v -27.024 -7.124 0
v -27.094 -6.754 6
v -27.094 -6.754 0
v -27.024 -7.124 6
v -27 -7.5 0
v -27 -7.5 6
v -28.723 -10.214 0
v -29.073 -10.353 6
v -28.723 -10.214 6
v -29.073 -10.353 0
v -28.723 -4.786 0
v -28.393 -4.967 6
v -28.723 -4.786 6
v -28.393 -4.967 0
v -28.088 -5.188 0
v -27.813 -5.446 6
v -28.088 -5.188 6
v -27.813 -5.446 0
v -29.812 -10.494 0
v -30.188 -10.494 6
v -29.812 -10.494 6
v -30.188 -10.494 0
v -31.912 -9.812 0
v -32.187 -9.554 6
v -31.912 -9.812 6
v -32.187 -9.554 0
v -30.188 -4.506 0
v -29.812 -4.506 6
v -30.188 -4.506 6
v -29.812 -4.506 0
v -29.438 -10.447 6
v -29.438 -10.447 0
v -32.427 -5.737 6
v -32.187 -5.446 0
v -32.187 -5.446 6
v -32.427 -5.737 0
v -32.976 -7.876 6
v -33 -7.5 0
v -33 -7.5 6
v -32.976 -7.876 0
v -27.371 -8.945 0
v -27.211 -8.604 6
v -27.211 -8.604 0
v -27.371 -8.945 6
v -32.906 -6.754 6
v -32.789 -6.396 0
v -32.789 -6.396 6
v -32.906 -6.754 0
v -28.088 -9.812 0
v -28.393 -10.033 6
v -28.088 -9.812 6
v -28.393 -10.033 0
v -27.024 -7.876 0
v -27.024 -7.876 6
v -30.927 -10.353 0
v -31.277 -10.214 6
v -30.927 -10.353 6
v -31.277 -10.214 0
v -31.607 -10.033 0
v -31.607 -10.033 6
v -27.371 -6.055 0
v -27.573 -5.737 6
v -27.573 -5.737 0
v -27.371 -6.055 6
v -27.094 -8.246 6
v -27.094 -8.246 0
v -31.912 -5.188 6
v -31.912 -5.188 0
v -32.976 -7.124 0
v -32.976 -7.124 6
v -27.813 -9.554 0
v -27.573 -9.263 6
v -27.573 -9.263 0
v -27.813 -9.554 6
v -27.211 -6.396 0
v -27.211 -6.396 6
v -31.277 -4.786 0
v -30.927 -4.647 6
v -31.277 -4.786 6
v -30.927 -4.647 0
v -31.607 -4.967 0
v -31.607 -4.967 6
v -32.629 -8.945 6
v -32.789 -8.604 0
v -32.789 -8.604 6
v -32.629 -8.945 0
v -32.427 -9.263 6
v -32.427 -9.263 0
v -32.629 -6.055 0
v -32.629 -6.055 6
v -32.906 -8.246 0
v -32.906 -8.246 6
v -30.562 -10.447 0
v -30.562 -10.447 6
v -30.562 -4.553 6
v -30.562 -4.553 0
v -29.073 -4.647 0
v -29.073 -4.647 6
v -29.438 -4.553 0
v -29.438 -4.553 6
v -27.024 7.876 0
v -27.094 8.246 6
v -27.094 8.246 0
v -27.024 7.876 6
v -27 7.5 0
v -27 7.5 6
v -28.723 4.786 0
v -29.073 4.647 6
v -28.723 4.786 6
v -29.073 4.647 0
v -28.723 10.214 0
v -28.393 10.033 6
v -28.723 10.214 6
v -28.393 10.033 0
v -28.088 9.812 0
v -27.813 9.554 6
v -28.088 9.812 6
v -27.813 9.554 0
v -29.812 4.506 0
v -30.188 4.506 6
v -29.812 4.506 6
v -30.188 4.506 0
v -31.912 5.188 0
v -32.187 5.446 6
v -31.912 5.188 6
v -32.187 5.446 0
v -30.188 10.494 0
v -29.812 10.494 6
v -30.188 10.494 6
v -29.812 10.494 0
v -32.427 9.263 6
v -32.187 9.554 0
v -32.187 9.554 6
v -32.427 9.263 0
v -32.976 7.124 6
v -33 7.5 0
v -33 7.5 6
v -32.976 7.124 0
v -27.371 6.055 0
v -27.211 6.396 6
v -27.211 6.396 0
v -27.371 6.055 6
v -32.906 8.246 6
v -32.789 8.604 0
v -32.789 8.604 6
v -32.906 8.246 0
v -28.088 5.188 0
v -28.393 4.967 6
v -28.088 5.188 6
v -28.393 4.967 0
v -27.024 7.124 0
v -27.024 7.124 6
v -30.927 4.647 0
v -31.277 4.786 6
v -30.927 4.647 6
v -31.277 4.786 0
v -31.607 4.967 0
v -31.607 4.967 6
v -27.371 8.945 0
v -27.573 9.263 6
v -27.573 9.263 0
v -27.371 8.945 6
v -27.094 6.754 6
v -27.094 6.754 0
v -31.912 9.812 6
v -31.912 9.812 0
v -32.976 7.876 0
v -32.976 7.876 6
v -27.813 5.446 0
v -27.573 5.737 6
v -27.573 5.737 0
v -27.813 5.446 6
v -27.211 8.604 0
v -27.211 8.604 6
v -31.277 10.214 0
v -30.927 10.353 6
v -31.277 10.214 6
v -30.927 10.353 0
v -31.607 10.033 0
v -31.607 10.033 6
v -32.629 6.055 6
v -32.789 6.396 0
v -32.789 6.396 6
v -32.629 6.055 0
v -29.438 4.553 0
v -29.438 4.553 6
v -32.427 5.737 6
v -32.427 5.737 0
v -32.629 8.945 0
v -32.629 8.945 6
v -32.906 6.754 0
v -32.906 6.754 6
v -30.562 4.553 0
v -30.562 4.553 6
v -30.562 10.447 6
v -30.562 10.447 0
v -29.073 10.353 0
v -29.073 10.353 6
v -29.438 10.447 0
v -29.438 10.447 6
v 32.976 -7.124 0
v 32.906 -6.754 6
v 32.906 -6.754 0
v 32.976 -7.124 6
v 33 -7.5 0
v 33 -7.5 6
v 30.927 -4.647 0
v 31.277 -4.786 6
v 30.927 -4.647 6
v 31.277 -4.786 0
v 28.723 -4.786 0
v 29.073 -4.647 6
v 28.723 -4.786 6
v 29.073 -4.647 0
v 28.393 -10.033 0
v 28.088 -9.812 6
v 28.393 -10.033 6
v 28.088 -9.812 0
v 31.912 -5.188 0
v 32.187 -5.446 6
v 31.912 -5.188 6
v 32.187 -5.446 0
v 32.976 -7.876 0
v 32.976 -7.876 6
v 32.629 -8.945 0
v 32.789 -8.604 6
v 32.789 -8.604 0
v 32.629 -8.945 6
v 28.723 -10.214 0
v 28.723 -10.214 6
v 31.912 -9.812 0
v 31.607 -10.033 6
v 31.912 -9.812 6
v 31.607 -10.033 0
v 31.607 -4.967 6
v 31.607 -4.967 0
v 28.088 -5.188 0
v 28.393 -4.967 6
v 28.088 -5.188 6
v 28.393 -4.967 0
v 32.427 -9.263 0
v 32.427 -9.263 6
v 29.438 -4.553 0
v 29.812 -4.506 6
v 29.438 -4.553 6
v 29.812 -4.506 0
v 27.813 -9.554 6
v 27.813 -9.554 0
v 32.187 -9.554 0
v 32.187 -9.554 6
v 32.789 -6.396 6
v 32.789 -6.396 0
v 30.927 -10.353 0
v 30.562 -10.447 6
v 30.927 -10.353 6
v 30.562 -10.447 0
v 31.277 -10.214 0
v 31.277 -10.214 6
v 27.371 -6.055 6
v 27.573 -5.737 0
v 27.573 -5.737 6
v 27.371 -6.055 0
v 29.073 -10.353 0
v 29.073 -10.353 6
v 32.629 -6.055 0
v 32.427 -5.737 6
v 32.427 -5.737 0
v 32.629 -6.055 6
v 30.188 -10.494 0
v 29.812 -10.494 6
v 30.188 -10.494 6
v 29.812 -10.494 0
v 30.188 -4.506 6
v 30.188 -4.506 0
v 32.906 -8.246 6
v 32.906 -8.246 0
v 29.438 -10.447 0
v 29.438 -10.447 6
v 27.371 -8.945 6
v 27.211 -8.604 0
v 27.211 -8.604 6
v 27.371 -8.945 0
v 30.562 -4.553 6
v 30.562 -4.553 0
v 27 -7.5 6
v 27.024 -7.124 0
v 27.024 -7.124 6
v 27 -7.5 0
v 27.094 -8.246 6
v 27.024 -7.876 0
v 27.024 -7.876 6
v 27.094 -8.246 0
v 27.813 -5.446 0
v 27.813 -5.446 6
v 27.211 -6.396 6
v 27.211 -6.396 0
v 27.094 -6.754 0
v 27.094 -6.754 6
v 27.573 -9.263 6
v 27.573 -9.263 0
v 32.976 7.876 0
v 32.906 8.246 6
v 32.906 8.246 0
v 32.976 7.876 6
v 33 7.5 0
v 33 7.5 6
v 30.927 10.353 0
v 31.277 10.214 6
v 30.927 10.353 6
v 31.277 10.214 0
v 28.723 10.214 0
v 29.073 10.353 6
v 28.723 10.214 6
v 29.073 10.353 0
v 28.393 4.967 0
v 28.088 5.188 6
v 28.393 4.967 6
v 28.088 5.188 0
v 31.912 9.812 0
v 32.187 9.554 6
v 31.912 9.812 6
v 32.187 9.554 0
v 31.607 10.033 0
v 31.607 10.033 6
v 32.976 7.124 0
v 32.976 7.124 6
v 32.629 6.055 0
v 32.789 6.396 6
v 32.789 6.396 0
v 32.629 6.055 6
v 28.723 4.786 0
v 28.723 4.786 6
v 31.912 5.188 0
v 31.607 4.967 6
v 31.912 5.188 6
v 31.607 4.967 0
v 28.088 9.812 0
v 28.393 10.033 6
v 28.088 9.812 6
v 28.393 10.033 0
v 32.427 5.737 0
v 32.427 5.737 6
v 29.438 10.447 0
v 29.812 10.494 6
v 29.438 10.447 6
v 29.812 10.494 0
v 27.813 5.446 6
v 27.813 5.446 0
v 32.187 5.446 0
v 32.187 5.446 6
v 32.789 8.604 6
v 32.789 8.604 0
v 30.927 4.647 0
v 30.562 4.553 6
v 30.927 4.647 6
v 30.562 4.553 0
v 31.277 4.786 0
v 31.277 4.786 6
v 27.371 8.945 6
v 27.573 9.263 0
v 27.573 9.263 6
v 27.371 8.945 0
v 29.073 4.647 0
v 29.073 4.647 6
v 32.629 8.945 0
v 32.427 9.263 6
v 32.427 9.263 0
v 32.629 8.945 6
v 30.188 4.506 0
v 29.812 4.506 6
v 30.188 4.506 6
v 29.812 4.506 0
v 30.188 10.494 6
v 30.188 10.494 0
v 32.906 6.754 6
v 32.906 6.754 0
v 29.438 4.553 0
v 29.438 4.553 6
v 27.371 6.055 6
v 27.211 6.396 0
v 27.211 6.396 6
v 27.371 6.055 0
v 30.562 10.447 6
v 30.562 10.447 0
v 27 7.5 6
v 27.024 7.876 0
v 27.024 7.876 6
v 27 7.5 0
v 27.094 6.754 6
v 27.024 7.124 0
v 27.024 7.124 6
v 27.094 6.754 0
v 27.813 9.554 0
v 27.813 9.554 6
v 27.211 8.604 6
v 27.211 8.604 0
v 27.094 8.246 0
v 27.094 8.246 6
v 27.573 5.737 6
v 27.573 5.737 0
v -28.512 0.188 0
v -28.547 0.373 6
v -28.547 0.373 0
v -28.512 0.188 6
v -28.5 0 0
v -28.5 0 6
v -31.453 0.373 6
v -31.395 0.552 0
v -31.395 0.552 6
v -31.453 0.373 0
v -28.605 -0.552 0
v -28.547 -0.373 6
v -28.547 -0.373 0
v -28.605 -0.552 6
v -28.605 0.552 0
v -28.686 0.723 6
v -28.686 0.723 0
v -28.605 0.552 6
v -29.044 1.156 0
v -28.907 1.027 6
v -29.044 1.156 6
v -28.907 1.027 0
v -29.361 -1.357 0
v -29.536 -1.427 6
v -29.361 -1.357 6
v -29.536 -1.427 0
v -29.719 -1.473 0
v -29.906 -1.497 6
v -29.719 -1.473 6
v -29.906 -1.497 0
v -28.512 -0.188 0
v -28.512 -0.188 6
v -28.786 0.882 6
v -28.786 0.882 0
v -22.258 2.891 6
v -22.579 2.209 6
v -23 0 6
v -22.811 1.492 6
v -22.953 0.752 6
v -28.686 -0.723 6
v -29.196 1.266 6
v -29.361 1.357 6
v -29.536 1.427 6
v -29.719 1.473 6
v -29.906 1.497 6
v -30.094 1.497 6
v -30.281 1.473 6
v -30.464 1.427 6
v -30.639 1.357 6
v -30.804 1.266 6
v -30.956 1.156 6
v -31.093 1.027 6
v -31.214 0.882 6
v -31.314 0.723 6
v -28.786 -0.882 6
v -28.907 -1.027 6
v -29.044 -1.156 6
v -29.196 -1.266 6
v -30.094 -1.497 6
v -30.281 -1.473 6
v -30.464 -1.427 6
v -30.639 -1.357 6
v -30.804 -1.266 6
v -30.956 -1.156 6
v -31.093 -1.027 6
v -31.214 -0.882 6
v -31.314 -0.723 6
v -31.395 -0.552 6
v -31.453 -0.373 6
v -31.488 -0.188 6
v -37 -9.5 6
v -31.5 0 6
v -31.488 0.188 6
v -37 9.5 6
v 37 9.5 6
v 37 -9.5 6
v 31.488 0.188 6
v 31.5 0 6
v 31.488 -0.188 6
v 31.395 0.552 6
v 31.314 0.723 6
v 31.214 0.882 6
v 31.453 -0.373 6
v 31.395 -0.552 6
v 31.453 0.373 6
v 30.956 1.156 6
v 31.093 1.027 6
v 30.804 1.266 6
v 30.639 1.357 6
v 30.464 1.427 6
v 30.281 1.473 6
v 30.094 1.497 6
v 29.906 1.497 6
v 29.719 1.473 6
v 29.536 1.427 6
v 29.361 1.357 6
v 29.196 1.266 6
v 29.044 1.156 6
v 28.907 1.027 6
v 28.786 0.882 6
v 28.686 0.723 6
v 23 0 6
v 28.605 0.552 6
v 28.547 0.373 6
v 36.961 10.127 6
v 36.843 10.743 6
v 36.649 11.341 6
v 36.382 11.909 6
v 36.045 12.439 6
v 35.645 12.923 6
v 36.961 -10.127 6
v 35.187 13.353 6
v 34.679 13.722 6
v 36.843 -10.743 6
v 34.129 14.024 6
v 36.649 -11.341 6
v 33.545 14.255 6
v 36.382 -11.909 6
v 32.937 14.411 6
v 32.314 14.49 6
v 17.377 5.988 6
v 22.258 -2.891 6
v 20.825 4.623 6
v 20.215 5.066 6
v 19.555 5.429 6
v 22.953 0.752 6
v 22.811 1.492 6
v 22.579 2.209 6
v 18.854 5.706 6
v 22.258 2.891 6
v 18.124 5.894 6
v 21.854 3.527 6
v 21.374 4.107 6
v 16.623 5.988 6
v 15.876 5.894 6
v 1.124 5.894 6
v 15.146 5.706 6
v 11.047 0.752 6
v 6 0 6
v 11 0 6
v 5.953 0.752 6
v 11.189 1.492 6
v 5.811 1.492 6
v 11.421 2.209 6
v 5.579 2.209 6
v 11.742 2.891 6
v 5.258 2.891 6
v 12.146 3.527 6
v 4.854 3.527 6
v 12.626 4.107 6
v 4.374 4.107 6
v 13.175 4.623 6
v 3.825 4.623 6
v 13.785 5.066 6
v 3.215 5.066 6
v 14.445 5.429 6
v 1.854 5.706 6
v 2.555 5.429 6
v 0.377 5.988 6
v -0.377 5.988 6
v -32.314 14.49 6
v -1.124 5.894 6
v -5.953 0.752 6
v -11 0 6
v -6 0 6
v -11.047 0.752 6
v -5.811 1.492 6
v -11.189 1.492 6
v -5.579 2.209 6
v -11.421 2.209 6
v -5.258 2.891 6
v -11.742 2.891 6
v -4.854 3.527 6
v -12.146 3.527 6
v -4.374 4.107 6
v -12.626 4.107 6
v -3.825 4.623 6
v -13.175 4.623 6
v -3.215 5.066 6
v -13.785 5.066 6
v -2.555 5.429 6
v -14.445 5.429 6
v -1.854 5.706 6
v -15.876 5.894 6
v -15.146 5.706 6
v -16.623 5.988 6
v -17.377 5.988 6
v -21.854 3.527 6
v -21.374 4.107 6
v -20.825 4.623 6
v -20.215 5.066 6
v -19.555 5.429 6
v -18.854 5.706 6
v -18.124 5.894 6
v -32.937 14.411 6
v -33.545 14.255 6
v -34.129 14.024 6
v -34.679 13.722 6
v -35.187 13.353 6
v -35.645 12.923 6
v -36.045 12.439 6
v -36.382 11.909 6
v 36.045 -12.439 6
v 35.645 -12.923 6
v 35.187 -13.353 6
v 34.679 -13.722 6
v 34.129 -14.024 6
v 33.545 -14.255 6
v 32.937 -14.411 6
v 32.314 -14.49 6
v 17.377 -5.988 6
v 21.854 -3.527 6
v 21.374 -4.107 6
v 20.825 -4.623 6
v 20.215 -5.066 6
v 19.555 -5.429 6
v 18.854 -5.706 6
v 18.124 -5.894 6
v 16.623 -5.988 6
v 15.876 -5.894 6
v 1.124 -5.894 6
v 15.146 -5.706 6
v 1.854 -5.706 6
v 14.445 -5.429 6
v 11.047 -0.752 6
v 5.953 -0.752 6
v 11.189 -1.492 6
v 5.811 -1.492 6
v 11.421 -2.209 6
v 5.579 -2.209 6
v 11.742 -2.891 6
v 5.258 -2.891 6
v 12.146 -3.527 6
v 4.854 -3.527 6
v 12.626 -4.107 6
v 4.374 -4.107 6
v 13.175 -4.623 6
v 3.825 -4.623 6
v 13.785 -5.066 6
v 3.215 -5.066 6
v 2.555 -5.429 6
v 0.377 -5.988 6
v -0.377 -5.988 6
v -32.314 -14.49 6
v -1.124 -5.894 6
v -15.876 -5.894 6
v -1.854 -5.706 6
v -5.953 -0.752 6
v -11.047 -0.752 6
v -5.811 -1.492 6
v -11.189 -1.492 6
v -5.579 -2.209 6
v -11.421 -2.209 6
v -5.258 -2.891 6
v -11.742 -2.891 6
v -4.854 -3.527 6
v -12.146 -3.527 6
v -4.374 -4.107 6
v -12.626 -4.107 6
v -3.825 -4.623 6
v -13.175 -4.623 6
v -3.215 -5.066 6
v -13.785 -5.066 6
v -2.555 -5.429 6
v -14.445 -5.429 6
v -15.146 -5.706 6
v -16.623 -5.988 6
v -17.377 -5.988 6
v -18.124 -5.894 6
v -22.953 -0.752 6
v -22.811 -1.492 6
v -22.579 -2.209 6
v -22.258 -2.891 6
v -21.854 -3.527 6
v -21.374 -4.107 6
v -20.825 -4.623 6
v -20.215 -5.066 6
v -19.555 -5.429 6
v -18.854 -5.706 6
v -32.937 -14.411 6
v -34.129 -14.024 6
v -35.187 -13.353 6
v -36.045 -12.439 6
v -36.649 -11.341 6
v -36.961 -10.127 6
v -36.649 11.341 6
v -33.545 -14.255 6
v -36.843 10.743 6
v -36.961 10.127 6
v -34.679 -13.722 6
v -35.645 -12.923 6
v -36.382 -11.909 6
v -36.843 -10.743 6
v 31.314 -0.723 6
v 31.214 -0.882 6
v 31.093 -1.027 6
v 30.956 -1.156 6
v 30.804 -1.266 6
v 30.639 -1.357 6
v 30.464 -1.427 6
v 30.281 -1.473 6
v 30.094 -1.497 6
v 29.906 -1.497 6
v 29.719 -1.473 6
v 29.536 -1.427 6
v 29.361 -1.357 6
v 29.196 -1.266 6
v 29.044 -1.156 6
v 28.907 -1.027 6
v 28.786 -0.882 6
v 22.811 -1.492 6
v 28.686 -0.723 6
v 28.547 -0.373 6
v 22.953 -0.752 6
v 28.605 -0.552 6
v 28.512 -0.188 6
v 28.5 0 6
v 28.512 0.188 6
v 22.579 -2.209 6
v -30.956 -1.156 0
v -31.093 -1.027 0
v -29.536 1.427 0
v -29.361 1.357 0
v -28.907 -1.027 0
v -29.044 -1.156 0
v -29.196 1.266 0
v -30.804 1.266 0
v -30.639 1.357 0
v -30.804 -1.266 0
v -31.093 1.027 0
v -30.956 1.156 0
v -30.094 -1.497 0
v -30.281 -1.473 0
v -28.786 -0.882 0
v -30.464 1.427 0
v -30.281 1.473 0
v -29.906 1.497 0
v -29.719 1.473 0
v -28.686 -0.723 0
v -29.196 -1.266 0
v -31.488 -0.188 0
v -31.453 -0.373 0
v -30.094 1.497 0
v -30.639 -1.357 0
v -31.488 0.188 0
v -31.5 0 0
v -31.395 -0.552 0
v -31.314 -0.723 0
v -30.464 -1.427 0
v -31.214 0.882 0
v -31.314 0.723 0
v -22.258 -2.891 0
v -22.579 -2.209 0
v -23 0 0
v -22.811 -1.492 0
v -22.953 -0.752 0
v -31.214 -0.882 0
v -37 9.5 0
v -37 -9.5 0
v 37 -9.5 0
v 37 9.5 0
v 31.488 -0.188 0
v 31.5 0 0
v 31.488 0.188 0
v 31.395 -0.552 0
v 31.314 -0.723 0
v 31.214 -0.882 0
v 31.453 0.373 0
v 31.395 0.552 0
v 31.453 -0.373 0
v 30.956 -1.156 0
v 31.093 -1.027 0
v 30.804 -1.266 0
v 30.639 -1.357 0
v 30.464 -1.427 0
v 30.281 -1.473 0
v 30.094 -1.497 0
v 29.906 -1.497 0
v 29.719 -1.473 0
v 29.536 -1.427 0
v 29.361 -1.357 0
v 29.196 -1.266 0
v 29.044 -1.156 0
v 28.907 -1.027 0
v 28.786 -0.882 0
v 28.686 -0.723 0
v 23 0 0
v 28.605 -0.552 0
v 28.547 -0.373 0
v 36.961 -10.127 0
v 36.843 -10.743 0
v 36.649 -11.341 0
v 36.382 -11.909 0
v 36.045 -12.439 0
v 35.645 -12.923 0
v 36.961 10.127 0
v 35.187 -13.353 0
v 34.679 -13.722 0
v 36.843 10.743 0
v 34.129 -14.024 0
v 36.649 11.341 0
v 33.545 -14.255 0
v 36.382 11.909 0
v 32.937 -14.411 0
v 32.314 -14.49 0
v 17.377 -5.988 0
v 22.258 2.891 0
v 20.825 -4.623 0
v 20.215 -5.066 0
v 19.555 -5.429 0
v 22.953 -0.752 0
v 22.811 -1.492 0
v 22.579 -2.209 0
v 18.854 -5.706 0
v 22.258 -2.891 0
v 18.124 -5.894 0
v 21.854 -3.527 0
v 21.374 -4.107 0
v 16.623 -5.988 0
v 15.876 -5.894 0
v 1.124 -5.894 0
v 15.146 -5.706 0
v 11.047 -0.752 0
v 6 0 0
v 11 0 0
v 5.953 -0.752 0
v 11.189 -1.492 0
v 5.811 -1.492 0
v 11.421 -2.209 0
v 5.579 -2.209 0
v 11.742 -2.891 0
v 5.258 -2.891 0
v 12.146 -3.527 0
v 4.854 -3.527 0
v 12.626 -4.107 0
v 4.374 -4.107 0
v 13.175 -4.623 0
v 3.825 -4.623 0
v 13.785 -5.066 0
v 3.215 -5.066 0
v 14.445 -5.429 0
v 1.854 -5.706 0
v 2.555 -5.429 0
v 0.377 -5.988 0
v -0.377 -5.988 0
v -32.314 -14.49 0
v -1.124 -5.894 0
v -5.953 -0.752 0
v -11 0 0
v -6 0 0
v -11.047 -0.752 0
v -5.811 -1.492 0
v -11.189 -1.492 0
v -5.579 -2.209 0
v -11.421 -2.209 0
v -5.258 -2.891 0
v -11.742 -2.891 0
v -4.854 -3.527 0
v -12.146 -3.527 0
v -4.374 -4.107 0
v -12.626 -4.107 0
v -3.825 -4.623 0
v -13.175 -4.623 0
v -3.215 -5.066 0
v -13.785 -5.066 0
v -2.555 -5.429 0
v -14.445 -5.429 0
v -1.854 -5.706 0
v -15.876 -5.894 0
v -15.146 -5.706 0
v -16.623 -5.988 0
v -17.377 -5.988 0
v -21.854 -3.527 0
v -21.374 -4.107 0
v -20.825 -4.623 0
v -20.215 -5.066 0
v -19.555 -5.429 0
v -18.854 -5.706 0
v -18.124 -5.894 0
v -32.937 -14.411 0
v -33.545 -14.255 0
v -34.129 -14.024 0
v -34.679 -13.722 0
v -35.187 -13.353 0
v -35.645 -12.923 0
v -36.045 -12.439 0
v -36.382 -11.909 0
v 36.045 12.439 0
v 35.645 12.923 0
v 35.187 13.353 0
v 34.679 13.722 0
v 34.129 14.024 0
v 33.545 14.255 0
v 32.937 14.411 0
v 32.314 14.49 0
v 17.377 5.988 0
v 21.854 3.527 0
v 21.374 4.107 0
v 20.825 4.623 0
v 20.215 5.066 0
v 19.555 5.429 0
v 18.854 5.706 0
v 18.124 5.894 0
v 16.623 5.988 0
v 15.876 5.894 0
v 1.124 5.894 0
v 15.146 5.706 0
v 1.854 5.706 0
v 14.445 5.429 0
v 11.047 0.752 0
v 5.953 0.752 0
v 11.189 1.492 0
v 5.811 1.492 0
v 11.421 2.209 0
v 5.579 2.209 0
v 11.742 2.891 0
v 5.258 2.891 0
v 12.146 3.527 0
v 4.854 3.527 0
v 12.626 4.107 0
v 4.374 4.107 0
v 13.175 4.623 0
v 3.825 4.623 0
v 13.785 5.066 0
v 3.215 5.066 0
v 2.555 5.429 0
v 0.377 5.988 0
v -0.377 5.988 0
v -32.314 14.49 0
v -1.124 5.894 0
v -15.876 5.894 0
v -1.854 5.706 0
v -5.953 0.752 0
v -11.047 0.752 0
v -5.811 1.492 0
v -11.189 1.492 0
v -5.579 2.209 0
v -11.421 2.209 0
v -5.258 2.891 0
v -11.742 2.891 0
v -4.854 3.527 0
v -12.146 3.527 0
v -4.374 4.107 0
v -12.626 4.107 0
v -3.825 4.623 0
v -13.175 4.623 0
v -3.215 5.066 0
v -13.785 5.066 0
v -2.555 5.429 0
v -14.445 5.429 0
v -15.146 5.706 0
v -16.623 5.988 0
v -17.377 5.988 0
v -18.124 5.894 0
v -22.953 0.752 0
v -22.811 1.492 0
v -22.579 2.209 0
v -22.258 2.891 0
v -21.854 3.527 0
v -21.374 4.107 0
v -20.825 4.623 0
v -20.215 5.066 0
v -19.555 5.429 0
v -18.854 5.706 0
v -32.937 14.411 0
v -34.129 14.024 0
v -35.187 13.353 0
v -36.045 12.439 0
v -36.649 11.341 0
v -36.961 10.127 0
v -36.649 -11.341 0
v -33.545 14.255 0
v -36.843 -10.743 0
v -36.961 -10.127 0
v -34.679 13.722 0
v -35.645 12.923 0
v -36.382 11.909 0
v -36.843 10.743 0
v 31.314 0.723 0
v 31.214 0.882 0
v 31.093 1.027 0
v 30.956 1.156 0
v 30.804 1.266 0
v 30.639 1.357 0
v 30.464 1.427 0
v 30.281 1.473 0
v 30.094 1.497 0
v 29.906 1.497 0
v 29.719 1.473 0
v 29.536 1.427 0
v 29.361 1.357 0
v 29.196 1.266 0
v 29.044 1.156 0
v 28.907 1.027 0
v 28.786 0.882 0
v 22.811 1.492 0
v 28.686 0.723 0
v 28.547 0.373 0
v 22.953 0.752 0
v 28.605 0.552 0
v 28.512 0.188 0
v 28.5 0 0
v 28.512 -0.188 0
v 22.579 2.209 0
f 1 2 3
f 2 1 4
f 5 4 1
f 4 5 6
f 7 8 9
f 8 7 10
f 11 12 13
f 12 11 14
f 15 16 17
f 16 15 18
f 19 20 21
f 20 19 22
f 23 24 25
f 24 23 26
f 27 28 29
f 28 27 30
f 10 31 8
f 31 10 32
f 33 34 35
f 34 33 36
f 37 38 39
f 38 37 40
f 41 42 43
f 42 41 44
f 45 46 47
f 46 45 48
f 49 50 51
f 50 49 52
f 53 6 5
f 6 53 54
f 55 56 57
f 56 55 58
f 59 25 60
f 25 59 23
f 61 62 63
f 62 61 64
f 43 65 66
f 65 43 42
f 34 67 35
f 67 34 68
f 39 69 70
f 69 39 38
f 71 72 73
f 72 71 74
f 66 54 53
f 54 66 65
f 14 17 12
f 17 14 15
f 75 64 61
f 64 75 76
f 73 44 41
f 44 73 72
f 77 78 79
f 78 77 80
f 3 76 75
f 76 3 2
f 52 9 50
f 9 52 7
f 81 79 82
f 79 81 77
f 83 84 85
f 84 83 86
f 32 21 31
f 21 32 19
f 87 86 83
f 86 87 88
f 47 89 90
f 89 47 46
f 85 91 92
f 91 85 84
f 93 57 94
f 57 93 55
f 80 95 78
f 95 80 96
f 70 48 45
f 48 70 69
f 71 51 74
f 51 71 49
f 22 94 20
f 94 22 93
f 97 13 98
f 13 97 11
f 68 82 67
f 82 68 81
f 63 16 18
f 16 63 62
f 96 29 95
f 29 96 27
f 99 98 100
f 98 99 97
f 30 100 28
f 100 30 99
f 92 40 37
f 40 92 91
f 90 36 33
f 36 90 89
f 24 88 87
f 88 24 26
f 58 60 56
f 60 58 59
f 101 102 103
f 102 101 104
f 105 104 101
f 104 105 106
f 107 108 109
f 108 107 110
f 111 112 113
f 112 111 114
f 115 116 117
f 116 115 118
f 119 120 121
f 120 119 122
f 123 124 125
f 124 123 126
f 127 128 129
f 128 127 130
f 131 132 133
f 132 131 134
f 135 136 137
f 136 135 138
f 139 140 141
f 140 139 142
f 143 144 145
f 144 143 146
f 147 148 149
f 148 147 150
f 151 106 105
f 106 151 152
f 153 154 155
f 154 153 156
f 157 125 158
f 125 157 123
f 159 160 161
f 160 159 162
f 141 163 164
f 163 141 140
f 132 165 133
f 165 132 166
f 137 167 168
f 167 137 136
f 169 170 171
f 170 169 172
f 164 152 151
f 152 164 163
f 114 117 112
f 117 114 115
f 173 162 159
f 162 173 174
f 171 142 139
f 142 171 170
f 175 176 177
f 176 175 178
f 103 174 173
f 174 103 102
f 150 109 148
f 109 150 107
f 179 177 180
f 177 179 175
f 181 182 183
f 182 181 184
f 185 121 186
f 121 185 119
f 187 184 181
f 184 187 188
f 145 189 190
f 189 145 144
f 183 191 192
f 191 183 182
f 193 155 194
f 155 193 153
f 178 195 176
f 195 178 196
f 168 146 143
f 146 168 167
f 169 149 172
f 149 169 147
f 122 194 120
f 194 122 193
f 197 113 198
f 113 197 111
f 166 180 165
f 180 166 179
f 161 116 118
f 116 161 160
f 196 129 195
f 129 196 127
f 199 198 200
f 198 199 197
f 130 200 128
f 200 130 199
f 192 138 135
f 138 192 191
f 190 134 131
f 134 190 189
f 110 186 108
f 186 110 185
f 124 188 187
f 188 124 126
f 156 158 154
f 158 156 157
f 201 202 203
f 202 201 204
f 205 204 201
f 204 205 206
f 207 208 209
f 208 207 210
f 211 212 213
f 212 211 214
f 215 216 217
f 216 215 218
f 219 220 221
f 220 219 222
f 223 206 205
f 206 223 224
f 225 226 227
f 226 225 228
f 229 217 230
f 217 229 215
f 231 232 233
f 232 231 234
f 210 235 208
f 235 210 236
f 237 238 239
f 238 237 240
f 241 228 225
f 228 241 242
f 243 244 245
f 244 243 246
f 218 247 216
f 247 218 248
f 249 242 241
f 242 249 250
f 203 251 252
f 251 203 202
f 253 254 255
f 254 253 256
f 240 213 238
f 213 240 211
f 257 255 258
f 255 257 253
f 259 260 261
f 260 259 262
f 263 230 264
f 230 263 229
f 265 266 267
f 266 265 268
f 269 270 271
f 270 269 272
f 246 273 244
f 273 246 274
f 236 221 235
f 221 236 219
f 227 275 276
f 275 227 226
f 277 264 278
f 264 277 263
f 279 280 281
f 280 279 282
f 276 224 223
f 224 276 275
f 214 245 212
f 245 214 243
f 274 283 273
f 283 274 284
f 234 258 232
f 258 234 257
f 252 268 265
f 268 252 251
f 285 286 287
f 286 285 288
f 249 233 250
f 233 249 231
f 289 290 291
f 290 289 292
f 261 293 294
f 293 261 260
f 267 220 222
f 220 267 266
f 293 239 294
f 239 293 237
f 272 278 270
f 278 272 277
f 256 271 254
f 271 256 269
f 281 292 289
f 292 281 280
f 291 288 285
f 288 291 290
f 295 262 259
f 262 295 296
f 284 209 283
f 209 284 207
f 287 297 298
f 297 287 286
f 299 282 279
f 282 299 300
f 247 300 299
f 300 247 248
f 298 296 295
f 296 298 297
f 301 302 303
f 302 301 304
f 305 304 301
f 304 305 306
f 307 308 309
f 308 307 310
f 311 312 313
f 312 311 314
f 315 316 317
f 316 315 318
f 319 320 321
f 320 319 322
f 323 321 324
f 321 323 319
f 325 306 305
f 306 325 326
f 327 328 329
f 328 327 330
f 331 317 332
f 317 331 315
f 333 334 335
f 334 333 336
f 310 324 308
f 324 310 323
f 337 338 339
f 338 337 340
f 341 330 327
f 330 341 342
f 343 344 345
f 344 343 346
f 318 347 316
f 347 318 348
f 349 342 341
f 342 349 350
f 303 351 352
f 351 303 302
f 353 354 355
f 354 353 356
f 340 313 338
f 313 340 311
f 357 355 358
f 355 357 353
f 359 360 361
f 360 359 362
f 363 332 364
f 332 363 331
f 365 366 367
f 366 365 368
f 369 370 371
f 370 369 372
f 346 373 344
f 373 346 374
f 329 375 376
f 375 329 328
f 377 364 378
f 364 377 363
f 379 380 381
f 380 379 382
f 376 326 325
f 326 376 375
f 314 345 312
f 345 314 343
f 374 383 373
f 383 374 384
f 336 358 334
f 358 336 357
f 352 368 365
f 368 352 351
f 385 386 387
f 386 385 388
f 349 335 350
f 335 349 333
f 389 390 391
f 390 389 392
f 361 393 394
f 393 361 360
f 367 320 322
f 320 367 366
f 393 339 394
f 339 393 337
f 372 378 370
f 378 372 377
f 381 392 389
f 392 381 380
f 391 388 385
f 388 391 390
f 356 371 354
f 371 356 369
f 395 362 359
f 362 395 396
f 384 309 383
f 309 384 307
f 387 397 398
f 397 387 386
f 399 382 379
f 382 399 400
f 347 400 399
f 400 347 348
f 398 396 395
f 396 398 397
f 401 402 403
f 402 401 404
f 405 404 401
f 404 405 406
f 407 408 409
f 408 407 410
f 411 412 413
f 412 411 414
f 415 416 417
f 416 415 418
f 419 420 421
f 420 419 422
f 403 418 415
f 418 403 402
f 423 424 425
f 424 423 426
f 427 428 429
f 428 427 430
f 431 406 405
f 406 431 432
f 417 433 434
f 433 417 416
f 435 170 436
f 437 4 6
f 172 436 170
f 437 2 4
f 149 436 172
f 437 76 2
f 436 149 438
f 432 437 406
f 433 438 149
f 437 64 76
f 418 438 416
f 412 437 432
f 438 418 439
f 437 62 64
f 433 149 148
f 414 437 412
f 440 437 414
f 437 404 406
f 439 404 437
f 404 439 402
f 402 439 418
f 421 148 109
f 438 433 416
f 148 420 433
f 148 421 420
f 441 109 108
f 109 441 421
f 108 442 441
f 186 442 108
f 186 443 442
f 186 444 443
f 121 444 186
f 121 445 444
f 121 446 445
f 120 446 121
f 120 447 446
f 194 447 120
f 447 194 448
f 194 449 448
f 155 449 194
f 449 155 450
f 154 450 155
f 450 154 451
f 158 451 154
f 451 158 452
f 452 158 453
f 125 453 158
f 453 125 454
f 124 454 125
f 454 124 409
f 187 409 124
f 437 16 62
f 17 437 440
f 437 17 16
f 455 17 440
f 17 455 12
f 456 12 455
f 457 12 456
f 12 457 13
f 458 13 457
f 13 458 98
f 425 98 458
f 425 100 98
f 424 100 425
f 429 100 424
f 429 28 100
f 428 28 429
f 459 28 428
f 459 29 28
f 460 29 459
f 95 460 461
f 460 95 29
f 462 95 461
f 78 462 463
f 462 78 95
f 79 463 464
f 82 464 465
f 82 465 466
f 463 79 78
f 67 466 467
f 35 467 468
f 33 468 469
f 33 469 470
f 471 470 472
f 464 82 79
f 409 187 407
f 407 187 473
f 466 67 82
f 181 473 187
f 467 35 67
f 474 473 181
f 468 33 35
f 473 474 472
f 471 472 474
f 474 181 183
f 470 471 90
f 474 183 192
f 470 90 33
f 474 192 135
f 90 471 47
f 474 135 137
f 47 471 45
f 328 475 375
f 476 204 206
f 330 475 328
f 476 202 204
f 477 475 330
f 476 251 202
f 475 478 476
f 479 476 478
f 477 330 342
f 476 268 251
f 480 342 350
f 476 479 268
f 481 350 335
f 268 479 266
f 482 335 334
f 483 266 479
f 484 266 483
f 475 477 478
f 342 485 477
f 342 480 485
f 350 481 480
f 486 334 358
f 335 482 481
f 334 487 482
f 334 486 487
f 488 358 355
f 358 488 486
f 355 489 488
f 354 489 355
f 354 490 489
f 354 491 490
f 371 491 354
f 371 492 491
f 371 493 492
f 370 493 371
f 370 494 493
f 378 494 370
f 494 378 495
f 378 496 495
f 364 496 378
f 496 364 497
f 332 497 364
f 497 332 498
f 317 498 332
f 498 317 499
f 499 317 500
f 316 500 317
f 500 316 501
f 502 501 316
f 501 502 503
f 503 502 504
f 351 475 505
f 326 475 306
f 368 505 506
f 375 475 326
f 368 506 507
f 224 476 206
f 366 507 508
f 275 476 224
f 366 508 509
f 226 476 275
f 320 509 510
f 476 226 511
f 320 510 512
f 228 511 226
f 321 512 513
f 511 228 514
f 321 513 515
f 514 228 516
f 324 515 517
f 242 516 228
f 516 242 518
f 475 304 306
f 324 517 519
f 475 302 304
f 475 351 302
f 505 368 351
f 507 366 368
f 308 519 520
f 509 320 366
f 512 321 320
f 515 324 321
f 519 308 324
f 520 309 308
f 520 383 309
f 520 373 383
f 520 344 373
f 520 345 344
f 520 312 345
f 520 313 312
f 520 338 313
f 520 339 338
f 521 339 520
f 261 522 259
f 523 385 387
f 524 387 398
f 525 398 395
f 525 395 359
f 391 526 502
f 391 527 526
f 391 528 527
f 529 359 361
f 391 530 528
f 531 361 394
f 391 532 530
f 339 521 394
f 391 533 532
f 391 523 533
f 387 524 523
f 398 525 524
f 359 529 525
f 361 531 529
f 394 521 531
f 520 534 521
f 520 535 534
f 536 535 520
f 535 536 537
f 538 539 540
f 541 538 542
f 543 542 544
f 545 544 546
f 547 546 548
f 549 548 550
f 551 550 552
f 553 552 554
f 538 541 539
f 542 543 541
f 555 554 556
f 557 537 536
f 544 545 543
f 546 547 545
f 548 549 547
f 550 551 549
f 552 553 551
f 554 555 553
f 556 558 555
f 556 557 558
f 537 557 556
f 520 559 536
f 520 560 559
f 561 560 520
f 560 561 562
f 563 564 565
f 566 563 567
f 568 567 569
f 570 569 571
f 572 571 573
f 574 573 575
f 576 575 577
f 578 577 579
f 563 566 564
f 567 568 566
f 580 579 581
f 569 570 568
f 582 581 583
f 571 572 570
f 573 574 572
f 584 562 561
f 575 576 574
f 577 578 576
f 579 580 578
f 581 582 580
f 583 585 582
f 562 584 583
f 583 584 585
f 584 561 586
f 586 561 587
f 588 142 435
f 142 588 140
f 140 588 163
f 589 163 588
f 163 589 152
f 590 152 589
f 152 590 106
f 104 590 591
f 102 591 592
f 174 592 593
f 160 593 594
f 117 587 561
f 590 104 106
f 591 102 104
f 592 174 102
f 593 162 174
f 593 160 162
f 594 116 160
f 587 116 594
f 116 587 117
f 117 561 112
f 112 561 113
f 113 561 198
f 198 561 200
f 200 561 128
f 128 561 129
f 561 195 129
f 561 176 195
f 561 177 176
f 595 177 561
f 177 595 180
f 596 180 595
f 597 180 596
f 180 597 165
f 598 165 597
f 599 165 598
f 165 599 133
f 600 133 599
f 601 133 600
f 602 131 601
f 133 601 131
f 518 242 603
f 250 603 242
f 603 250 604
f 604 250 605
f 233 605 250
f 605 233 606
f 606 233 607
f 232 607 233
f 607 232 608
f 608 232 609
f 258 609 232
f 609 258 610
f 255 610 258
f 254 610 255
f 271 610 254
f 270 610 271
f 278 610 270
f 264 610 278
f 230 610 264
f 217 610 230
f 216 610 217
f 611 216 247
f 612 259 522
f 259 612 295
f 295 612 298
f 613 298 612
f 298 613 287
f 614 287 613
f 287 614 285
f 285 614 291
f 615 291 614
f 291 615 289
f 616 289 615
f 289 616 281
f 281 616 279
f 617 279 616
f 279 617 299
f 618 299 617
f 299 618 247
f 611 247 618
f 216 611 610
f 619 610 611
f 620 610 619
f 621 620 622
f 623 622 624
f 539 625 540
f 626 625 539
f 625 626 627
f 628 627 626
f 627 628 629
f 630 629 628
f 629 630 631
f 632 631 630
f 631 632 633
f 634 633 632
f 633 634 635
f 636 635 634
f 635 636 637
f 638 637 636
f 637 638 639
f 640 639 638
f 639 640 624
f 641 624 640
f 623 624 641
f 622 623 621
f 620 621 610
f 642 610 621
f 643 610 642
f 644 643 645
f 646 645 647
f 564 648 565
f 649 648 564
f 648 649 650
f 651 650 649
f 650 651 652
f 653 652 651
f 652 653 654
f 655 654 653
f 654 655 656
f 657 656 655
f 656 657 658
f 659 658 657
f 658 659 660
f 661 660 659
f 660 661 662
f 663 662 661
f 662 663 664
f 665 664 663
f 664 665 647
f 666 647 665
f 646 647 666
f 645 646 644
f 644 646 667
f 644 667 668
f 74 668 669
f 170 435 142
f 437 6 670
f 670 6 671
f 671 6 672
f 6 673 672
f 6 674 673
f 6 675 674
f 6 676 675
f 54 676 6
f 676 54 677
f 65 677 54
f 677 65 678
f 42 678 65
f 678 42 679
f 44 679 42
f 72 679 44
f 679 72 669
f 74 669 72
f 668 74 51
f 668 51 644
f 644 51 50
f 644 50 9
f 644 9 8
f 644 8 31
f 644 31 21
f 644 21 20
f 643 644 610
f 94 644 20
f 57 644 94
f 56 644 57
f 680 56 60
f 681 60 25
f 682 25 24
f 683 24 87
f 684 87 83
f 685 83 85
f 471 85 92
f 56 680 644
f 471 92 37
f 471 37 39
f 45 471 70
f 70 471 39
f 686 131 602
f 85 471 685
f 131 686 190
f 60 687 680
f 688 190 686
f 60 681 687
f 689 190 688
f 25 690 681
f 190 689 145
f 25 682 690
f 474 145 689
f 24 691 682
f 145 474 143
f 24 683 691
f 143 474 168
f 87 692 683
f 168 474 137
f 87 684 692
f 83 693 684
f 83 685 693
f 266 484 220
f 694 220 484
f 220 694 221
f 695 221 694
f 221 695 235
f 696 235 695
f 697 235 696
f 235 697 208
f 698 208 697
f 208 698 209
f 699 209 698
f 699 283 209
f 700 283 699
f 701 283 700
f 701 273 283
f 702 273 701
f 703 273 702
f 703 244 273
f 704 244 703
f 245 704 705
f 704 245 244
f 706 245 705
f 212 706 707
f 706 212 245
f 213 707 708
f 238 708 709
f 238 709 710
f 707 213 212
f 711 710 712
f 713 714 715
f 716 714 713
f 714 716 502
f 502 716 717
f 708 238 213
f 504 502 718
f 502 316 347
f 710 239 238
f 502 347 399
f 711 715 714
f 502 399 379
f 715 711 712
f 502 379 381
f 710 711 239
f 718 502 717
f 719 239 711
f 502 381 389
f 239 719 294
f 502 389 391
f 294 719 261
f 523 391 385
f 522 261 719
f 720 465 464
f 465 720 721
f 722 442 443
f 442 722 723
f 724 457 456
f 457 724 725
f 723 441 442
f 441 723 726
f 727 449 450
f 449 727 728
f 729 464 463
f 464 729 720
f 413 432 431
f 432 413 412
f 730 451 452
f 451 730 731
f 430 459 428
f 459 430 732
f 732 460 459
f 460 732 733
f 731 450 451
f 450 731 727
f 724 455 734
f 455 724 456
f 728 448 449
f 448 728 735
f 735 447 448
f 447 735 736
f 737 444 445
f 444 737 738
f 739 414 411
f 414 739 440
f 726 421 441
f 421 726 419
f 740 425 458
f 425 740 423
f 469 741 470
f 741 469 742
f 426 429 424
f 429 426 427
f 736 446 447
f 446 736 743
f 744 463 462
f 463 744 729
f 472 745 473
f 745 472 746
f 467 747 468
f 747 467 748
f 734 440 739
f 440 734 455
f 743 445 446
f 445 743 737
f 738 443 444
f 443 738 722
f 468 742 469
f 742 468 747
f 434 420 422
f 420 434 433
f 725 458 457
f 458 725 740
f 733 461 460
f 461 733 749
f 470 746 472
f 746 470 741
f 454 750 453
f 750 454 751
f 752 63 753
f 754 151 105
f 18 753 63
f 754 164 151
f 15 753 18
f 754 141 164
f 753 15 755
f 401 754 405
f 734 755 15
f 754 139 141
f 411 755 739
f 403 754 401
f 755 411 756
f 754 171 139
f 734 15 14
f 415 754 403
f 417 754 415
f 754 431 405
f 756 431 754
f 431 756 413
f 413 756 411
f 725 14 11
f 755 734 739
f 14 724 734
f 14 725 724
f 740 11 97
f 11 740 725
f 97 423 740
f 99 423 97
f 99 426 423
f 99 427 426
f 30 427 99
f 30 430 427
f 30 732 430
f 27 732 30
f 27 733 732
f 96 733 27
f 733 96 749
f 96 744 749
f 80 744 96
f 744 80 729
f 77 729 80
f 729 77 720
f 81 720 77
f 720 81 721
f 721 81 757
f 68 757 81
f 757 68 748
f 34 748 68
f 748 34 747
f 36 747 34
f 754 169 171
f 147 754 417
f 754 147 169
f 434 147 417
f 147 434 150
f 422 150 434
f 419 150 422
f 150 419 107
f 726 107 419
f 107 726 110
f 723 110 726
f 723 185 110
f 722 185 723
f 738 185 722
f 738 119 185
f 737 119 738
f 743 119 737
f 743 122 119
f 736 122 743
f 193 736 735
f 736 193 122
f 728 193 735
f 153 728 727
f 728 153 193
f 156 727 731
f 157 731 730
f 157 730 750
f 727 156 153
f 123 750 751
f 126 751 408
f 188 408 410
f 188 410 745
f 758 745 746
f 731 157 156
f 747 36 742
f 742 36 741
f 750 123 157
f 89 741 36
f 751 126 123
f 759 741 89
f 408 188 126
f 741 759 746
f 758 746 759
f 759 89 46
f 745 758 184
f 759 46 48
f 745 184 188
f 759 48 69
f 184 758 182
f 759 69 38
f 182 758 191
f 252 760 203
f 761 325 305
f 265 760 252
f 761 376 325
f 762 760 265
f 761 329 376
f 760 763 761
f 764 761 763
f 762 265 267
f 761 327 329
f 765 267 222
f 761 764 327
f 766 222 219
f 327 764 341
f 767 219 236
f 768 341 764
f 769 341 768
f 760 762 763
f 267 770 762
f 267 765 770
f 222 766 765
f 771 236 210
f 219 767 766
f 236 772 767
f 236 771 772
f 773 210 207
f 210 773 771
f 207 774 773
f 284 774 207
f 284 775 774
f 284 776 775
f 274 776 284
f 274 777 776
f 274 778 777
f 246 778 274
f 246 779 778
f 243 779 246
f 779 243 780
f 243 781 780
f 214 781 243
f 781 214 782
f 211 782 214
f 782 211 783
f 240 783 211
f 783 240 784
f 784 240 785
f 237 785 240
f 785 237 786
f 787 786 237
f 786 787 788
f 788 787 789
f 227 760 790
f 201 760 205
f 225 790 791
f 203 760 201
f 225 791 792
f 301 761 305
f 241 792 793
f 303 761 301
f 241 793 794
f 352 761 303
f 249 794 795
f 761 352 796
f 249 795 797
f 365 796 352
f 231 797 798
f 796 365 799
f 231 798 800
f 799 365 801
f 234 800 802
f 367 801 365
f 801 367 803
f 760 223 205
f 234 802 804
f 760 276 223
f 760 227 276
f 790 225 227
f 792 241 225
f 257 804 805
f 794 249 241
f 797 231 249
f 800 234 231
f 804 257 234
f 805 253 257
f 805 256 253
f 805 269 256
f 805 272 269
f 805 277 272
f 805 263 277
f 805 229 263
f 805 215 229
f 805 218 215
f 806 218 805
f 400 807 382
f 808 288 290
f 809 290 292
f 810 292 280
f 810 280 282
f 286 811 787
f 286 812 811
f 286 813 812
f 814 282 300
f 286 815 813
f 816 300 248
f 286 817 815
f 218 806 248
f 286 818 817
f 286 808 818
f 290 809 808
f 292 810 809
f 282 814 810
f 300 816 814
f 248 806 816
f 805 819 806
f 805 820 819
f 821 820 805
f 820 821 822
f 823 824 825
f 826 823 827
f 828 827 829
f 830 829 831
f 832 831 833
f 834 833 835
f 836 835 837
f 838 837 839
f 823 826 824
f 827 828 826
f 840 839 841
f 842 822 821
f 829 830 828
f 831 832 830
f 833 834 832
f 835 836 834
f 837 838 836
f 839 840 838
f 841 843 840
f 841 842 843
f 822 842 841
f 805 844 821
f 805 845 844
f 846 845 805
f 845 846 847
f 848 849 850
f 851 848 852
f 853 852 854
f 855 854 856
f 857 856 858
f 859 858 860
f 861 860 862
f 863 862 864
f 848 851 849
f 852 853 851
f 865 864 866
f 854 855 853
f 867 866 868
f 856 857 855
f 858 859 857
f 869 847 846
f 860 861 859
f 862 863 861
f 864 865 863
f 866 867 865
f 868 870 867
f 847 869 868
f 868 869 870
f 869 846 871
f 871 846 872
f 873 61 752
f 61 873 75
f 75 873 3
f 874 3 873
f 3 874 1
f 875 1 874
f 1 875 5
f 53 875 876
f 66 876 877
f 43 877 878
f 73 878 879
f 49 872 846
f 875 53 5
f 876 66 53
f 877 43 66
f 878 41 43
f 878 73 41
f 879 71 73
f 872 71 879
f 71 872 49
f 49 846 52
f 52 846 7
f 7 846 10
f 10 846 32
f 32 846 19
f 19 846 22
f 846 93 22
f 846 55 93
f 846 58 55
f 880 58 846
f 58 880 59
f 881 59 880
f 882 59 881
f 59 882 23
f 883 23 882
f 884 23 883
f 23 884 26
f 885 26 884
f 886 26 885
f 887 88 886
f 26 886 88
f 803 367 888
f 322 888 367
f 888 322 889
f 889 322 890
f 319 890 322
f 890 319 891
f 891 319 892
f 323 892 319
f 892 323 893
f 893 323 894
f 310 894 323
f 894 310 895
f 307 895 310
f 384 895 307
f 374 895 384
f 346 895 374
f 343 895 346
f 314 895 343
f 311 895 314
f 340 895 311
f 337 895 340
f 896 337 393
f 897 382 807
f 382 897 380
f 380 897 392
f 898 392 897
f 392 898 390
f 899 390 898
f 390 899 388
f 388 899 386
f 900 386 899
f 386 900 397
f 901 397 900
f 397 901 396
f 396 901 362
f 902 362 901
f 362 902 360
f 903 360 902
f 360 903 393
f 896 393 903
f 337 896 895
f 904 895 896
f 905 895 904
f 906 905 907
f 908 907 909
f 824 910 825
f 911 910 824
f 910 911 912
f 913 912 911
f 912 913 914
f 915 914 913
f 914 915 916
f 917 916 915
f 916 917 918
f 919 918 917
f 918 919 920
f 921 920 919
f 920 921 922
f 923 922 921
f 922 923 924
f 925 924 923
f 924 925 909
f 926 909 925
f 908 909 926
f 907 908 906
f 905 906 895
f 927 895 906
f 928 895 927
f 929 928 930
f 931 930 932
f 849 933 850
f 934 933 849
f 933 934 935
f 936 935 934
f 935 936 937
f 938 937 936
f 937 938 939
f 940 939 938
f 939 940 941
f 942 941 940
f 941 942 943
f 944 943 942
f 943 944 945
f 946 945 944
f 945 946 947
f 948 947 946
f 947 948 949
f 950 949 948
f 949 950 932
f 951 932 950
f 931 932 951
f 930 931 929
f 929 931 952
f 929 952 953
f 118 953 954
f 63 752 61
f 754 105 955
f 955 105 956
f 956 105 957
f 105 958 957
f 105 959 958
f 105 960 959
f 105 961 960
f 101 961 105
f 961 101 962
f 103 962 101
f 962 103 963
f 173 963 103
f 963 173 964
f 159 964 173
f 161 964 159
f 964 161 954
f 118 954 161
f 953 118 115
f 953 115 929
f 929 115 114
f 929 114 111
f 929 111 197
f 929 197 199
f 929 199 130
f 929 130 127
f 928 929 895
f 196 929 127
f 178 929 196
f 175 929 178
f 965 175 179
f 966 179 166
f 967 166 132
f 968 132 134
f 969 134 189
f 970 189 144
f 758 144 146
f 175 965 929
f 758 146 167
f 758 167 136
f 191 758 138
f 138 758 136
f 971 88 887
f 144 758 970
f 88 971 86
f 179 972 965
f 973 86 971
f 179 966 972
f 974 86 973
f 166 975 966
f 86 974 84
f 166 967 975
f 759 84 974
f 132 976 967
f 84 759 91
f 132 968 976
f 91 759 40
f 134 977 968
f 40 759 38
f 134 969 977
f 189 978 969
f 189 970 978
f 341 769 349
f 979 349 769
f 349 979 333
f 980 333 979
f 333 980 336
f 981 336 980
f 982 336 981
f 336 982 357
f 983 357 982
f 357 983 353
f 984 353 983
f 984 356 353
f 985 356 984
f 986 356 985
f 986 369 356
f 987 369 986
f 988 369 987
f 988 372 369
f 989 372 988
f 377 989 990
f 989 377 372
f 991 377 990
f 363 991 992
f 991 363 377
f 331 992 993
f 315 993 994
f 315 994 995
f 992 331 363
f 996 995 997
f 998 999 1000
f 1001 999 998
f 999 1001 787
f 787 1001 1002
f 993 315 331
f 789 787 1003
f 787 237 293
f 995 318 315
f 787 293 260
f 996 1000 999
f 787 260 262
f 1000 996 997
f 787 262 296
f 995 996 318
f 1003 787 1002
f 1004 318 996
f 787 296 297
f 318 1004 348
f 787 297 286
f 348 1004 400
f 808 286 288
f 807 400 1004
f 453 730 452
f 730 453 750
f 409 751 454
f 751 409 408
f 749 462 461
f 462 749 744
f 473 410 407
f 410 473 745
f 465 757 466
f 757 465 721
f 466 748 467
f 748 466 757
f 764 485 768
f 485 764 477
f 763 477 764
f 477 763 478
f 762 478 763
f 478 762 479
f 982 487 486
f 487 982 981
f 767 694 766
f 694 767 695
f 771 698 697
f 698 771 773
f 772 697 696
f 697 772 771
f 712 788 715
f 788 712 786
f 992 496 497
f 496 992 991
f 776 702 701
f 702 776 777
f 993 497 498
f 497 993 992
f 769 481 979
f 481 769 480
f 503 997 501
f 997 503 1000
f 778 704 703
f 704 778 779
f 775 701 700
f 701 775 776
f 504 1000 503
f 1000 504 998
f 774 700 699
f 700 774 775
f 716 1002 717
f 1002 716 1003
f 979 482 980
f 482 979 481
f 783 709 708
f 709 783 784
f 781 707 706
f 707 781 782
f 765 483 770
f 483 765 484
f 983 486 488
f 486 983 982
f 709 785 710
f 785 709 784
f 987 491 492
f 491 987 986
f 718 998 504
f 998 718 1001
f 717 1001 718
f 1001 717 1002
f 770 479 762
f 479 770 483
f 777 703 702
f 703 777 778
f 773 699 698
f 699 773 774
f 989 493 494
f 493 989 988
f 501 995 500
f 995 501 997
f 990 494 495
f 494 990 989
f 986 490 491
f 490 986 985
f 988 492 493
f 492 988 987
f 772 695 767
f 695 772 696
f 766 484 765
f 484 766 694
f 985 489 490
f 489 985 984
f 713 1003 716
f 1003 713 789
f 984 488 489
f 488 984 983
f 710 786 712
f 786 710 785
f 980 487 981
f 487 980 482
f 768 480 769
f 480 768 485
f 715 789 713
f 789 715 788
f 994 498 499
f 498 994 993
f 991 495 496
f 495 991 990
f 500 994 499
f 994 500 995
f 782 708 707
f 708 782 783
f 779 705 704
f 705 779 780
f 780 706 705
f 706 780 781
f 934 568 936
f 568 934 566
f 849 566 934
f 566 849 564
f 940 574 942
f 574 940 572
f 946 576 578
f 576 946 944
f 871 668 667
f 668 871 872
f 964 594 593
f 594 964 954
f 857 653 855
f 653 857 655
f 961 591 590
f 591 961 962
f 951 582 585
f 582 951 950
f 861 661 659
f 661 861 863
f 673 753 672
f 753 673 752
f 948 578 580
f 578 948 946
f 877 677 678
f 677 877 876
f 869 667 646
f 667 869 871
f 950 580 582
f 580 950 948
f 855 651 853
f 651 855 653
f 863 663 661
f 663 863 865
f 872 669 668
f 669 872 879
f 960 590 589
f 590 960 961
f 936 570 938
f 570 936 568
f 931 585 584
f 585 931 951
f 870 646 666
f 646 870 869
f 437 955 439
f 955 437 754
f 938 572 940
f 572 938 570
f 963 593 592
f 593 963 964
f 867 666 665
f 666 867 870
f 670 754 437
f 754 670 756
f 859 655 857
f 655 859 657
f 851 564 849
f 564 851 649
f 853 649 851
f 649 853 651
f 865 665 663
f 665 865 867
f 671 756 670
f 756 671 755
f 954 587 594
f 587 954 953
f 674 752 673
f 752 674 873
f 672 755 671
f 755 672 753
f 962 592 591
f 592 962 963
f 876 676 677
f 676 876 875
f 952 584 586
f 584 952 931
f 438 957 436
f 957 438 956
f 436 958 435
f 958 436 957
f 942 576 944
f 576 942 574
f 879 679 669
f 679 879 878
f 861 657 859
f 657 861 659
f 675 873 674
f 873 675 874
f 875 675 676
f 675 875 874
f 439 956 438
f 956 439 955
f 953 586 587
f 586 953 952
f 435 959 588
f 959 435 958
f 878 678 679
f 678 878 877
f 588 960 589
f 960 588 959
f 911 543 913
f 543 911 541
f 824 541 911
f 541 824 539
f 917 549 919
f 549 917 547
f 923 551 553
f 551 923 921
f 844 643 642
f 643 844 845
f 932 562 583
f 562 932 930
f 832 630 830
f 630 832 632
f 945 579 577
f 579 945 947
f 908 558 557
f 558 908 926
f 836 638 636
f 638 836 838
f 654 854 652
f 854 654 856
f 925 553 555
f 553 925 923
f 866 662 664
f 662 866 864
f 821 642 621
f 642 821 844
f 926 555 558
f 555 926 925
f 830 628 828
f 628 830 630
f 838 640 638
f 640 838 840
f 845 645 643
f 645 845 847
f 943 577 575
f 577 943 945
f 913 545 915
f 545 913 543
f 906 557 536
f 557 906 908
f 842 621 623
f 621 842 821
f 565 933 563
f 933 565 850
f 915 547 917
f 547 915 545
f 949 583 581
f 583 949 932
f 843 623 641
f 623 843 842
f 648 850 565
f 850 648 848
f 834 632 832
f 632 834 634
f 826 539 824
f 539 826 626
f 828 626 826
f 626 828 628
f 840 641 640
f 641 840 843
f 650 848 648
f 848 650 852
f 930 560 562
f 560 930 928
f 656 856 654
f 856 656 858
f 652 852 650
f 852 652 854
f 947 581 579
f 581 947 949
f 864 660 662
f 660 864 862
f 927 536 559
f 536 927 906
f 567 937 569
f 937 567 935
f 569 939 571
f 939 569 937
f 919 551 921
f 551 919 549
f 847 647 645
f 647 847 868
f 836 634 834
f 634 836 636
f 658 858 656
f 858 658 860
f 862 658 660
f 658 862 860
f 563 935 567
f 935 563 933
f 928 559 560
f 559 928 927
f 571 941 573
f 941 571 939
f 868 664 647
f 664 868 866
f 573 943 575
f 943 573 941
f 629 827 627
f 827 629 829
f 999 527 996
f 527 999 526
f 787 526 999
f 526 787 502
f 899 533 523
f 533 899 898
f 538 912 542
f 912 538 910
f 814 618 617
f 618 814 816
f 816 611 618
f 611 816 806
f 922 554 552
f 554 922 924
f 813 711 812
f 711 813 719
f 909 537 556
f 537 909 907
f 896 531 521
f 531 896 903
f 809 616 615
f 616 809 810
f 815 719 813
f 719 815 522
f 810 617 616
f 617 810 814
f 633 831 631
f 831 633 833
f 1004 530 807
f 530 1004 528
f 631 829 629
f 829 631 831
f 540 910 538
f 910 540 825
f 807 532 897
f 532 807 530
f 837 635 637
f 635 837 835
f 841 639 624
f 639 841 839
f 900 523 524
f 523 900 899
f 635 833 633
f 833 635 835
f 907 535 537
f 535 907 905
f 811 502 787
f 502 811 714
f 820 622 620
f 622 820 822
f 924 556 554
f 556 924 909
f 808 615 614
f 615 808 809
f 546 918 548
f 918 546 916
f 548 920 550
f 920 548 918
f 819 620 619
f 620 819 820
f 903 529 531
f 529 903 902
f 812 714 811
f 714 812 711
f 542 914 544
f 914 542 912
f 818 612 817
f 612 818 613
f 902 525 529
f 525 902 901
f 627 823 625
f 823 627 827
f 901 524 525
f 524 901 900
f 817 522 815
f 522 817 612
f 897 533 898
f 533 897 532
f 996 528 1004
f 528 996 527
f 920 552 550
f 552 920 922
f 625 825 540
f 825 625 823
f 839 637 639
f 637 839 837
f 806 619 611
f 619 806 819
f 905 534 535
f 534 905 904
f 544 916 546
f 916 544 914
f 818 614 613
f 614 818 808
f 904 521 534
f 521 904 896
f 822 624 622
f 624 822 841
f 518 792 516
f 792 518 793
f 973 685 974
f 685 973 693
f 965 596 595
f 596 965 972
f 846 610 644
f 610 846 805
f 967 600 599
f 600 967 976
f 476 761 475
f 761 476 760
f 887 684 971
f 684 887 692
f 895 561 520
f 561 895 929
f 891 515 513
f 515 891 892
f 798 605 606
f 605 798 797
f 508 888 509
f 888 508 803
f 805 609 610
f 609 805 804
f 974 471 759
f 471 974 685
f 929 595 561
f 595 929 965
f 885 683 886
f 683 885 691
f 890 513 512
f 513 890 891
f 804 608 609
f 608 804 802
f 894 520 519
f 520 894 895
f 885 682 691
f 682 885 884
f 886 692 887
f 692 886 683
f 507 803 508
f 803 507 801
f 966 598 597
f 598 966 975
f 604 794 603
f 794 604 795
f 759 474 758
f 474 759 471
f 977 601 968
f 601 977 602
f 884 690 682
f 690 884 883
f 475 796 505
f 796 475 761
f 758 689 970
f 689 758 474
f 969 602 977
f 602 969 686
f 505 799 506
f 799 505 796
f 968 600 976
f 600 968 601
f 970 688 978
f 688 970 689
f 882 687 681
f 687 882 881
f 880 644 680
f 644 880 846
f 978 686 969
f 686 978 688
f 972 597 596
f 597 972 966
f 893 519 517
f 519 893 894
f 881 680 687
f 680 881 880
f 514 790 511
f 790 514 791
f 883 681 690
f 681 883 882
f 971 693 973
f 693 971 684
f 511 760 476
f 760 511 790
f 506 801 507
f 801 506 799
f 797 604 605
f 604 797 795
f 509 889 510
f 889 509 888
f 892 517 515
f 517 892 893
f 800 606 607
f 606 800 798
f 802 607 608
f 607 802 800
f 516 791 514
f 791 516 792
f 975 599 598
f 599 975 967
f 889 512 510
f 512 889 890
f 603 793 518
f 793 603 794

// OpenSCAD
$fn = 50;


difference() {
	union() {
		hull() {
			translate(v = [-32.0000000000, 9.5000000000, 0]) {
				cylinder(h = 6, r = 5);
			}
			translate(v = [32.0000000000, 9.5000000000, 0]) {
				cylinder(h = 6, r = 5);
			}
			translate(v = [-32.0000000000, -9.5000000000, 0]) {
				cylinder(h = 6, r = 5);
			}
			translate(v = [32.0000000000, -9.5000000000, 0]) {
				cylinder(h = 6, r = 5);
			}
		}
	}
	union() {
		#translate(v = [-30.0000000000, -7.5000000000, 0]) {
			cylinder(h = 6, r = 3.0000000000);
		}
		#translate(v = [-30.0000000000, 7.5000000000, 0]) {
			cylinder(h = 6, r = 3.0000000000);
		}
		#translate(v = [30.0000000000, -7.5000000000, 0]) {
			cylinder(h = 6, r = 3.0000000000);
		}
		#translate(v = [30.0000000000, 7.5000000000, 0]) {
			cylinder(h = 6, r = 3.0000000000);
		}
		#translate(v = [-30.0000000000, -7.5000000000, -100.0000000000]) {
			cylinder(h = 200, r = 3.0000000000);
		}
		#translate(v = [-30.0000000000, 7.5000000000, -100.0000000000]) {
			cylinder(h = 200, r = 3.0000000000);
		}
		#translate(v = [30.0000000000, -7.5000000000, -100.0000000000]) {
			cylinder(h = 200, r = 3.0000000000);
		}
		#translate(v = [30.0000000000, 7.5000000000, -100.0000000000]) {
			cylinder(h = 200, r = 3.0000000000);
		}
		#translate(v = [-30.0000000000, -7.5000000000, 0]) {
			cylinder(h = 6, r = 1.5000000000);
		}
		#translate(v = [-30.0000000000, 0.0000000000, 0]) {
			cylinder(h = 6, r = 1.5000000000);
		}
		#translate(v = [-30.0000000000, 7.5000000000, 0]) {
			cylinder(h = 6, r = 1.5000000000);
		}
		#translate(v = [30.0000000000, -7.5000000000, 0]) {
			cylinder(h = 6, r = 1.5000000000);
		}
		#translate(v = [30.0000000000, 0.0000000000, 0]) {
			cylinder(h = 6, r = 1.5000000000);
		}
		#translate(v = [30.0000000000, 7.5000000000, 0]) {
			cylinder(h = 6, r = 1.5000000000);
		}
		#translate(v = [-30.0000000000, -7.5000000000, 0]) {
			cylinder(h = 6, r = 1.5000000000);
		}
		#translate(v = [-30.0000000000, 0.0000000000, 0]) {
			cylinder(h = 6, r = 1.5000000000);
		}
		#translate(v = [-30.0000000000, 7.5000000000, 0]) {
			cylinder(h = 6, r = 1.5000000000);
		}
		#translate(v = [30.0000000000, -7.5000000000, 0]) {
			cylinder(h = 6, r = 1.5000000000);
		}
		#translate(v = [30.0000000000, 0.0000000000, 0]) {
			cylinder(h = 6, r = 1.5000000000);
		}
		#translate(v = [30.0000000000, 7.5000000000, 0]) {
			cylinder(h = 6, r = 1.5000000000);
		}
		#translate(v = [-30.0000000000, -7.5000000000, 0]) {
			cylinder(h = 6, r = 1.5000000000);
		}
		#translate(v = [-30.0000000000, 0.0000000000, 0]) {
			cylinder(h = 6, r = 1.5000000000);
		}
		#translate(v = [-30.0000000000, 7.5000000000, 0]) {
			cylinder(h = 6, r = 1.5000000000);
		}
		#translate(v = [30.0000000000, -7.5000000000, 0]) {
			cylinder(h = 6, r = 1.5000000000);
		}
		#translate(v = [30.0000000000, 0.0000000000, 0]) {
			cylinder(h = 6, r = 1.5000000000);
		}
		#translate(v = [30.0000000000, 7.5000000000, 0]) {
			cylinder(h = 6, r = 1.5000000000);
		}
		#translate(v = [-17.0000000000, 0, 0]) {
			cylinder(h = 6, r = 6.0000000000);
		}
		#cylinder(h = 6, r = 6.0000000000);
		#translate(v = [17.0000000000, 0, 0]) {
			cylinder(h = 6, r = 6.0000000000);
		}
	}
}
